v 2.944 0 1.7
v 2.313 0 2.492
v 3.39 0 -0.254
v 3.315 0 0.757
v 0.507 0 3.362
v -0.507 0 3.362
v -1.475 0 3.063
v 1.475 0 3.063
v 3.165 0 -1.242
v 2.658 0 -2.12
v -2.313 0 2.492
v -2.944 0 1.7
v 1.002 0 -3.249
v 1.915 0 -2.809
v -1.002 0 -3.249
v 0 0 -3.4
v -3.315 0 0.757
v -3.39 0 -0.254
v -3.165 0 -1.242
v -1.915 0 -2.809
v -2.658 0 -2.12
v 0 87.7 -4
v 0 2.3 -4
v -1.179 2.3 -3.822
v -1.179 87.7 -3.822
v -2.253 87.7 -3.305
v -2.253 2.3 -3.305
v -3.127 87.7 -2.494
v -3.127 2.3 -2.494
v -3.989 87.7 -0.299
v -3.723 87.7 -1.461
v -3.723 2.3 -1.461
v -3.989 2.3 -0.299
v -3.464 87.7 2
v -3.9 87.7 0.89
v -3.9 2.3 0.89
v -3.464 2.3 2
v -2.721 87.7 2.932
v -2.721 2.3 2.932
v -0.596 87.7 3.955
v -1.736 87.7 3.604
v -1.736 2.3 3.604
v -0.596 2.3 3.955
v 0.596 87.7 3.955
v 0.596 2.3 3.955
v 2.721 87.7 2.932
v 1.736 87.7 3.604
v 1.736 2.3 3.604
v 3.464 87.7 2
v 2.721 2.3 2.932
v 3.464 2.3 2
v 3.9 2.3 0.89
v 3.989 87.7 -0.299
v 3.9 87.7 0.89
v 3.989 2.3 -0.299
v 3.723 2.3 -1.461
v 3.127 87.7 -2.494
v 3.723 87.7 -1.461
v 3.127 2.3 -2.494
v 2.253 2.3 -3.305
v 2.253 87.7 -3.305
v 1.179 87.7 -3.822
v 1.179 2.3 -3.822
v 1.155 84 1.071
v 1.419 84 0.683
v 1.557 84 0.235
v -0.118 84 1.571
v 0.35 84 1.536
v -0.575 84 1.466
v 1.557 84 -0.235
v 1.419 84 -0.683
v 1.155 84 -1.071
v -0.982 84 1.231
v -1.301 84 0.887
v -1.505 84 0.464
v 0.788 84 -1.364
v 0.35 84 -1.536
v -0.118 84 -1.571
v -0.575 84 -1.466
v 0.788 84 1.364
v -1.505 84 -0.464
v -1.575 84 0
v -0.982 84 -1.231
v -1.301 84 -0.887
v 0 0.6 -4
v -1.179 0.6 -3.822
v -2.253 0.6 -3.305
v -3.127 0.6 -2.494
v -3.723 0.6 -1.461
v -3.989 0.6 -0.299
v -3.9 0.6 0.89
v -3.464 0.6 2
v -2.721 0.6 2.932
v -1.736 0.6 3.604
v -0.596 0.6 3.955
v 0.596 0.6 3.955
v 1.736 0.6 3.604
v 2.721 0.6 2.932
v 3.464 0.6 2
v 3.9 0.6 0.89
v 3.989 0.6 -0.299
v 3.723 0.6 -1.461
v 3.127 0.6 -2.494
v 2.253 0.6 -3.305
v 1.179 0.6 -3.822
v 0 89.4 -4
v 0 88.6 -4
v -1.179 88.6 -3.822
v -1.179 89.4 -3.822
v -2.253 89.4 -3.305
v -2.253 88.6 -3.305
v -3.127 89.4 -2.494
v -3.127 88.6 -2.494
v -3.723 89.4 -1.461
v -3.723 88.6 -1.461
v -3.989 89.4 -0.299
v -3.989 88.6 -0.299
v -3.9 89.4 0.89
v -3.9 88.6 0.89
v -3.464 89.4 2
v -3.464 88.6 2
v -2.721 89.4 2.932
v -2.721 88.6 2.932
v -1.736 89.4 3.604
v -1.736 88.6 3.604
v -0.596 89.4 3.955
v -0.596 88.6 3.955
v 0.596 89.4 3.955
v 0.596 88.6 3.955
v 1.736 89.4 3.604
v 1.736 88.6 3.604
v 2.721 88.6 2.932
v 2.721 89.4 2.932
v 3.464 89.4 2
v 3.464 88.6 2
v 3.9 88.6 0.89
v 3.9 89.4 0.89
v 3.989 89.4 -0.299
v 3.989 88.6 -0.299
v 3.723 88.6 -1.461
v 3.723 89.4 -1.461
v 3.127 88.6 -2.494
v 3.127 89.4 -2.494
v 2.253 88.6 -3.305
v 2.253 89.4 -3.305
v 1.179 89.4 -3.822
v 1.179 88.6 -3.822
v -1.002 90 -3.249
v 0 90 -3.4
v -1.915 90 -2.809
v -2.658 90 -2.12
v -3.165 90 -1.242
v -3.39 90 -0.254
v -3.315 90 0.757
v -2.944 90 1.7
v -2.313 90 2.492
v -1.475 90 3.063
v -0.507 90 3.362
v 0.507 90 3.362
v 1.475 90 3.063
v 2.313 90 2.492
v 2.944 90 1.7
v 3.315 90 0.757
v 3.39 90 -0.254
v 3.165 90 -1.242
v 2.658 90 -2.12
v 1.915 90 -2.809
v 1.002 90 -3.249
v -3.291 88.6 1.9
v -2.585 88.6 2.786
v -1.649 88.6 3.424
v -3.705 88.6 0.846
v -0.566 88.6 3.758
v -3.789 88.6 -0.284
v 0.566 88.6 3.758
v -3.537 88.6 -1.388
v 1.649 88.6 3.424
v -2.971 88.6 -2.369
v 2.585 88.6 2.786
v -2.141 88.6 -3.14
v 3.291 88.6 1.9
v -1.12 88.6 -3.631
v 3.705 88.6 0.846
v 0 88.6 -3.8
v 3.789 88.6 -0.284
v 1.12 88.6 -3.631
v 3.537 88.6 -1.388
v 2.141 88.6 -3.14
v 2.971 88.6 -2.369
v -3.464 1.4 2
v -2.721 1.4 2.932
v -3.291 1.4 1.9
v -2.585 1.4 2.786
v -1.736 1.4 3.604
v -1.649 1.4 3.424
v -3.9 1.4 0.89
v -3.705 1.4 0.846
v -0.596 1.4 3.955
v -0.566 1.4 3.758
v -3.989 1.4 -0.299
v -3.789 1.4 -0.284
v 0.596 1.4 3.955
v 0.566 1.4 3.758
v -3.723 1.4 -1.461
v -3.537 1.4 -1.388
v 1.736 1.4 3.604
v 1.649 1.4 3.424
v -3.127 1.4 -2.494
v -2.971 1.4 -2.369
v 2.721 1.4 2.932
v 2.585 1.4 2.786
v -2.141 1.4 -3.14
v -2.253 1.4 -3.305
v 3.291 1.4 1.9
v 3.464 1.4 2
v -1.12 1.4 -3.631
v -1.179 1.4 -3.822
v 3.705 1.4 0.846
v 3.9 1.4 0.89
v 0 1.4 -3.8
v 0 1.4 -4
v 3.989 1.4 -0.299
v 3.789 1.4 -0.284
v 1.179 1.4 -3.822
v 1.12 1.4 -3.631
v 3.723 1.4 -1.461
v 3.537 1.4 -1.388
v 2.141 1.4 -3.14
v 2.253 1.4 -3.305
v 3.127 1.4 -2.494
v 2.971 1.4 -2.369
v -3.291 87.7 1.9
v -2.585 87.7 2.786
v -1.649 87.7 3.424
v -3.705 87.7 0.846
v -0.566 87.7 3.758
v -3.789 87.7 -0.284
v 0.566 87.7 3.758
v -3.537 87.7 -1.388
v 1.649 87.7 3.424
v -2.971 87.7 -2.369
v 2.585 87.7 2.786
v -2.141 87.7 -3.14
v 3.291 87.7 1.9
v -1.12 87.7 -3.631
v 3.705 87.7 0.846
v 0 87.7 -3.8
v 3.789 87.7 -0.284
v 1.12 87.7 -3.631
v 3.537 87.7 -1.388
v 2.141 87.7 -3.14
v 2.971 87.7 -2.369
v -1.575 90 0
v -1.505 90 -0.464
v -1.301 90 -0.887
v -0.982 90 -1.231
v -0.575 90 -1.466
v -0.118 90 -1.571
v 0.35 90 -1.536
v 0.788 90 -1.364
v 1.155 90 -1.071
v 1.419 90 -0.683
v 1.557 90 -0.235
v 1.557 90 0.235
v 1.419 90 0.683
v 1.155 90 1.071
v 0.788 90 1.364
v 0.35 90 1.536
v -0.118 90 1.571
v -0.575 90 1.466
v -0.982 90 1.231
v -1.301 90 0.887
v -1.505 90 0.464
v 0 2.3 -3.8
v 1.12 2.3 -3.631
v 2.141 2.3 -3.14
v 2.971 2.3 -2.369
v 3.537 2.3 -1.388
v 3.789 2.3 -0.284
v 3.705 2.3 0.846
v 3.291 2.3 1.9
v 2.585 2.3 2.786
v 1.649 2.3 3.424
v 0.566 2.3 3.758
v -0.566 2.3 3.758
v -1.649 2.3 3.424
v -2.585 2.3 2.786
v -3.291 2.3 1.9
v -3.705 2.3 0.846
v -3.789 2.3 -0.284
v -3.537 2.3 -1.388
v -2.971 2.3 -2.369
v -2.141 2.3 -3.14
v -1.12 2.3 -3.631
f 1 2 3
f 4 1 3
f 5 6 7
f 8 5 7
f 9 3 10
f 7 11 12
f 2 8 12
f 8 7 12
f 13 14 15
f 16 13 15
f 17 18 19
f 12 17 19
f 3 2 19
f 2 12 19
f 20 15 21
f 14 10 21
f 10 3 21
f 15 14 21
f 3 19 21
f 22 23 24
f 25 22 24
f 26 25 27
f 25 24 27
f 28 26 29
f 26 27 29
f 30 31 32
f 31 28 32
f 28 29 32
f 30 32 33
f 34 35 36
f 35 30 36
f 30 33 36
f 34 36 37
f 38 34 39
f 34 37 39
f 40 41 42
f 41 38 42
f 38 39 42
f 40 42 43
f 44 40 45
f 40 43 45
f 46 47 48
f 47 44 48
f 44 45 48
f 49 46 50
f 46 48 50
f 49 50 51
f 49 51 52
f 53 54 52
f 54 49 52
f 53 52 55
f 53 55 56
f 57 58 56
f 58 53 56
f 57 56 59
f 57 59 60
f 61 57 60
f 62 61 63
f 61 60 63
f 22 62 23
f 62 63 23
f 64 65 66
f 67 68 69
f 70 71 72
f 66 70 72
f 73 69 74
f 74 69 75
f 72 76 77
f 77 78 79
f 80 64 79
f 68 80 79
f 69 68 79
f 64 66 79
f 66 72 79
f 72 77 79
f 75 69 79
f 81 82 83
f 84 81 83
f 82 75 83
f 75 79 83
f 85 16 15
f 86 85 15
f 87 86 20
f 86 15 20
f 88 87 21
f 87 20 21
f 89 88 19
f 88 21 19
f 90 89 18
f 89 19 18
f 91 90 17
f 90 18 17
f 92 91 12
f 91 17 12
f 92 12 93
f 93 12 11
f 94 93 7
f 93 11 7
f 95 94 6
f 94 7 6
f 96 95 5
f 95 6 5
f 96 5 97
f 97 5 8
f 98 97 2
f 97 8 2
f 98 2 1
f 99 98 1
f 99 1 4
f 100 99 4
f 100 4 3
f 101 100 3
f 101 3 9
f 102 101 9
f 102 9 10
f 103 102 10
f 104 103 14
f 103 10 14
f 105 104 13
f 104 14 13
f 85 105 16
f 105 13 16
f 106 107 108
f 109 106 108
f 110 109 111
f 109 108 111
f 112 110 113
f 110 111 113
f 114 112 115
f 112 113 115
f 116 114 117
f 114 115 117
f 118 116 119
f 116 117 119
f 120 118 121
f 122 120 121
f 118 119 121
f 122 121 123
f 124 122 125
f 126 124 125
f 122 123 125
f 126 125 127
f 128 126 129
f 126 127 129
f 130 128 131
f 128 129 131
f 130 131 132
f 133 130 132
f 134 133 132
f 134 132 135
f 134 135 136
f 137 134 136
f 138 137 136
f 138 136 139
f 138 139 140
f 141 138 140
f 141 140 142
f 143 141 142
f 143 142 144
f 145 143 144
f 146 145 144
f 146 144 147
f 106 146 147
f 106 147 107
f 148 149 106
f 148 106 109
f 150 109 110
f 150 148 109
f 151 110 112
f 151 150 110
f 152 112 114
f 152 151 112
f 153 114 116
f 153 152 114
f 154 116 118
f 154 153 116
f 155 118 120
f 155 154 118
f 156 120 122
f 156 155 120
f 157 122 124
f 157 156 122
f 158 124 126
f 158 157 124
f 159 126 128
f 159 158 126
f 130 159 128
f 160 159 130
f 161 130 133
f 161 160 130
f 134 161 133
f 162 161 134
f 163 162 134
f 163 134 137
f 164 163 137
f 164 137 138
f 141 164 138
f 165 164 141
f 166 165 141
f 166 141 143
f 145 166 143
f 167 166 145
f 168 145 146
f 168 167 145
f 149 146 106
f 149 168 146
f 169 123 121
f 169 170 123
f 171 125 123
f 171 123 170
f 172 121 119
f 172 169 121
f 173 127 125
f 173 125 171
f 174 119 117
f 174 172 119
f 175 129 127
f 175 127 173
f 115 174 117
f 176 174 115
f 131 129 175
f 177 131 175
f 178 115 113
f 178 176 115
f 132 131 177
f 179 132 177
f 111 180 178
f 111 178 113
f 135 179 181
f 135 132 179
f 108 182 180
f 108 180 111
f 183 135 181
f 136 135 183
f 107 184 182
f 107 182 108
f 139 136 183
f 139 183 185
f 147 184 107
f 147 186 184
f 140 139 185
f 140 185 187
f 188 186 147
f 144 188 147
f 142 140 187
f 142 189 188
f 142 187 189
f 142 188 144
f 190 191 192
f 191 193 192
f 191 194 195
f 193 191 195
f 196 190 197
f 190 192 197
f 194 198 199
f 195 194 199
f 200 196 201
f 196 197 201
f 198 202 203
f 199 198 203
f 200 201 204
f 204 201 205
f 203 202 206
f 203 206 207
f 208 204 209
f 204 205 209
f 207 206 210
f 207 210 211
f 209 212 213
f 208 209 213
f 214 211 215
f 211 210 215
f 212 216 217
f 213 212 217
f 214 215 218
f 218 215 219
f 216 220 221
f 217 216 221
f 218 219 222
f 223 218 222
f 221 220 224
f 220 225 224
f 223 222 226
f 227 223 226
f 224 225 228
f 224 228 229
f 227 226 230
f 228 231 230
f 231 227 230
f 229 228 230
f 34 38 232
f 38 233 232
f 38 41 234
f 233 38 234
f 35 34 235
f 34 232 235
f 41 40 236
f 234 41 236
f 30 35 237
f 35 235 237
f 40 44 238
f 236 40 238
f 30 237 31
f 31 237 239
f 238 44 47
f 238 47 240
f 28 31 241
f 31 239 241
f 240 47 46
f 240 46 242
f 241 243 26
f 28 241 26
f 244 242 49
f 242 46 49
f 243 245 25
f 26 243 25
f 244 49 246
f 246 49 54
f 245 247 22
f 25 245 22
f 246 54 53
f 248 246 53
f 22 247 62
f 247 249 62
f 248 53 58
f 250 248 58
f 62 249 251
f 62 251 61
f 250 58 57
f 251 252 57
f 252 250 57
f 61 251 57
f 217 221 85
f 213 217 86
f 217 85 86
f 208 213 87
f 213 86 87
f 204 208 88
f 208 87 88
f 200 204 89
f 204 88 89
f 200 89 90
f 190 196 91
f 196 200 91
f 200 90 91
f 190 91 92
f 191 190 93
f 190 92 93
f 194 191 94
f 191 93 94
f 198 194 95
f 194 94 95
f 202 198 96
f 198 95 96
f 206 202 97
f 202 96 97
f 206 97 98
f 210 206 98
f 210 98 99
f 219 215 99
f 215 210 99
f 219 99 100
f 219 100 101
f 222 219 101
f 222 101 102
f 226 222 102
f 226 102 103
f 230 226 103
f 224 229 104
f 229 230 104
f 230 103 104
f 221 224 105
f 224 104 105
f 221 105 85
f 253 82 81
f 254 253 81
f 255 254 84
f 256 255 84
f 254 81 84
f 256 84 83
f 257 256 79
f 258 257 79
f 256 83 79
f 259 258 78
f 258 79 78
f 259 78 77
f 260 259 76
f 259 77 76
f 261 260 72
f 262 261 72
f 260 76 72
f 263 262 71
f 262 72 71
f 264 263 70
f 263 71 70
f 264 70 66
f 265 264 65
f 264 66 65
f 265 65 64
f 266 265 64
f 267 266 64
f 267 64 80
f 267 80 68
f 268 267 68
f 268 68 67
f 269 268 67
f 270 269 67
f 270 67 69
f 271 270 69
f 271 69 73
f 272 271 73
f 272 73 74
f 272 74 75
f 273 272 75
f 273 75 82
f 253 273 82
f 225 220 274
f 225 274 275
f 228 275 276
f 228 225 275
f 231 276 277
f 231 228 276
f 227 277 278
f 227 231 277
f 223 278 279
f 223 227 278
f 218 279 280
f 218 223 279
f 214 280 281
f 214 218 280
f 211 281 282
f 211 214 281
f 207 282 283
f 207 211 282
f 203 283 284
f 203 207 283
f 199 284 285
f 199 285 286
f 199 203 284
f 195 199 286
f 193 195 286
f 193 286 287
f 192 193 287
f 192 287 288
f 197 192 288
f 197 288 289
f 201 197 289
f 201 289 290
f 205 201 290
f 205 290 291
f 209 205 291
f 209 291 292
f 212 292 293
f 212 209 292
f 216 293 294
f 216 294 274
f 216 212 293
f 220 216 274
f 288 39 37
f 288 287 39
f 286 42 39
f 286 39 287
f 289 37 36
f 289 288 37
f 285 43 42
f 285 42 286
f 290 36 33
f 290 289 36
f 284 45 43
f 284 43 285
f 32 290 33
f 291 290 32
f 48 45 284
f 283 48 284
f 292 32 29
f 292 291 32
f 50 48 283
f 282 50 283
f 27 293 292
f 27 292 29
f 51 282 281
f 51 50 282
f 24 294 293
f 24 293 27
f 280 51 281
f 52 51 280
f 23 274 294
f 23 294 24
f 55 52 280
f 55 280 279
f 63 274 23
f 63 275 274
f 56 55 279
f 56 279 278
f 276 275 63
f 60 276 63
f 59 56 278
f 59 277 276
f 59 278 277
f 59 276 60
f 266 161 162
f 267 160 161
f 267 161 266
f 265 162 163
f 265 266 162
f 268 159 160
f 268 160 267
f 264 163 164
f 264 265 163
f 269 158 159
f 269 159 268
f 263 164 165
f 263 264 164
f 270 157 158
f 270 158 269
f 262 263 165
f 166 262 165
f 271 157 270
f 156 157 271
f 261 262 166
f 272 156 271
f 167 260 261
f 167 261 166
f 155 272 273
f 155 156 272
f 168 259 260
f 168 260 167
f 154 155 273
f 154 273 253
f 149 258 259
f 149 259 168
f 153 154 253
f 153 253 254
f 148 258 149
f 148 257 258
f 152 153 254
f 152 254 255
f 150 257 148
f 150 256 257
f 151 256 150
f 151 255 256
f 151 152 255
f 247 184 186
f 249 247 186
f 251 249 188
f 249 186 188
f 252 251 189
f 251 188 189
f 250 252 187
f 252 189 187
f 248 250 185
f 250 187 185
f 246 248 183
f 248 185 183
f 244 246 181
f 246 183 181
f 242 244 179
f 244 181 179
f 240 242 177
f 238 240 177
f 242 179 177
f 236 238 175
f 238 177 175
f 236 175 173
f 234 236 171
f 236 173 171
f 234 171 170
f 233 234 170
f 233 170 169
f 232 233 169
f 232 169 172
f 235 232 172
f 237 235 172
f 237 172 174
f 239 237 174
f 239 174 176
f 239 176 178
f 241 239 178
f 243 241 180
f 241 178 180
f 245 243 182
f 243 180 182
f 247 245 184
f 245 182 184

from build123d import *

# Parameters (mm, degrees)
SKETCH1_R                        = 4
BOSS_EXTRUDE1_DEPTH              = 90
CHAMFER1_SIZE                    = 0.6
CUT_EXTRUDE1_START               = -1.4
SKETCH2_R                        = 4
SKETCH2_R_2                      = 3.8
CUT_EXTRUDE1_DEPTH               = 0.9
TAP_DRILL_FOR_M3_HELICOIL1_D     = 3.15
TAP_DRILL_FOR_M3_HELICOIL1_DEPTH = 6


with BuildPart() as part:
    # Sketch1 → Boss-Extrude1 (new body)
    with BuildSketch(Plane(origin=(0, 0, 0), x_dir=(1, 0, 0), z_dir=(0, 1, 0))):
        with Locations(Location((0, 0, 0), (0, 0, 90))):
            Circle(SKETCH1_R)
    extrude(amount=BOSS_EXTRUDE1_DEPTH)

    # Chamfer1
    chamfer1_edges = [part.edges().sort_by_distance(p)[0] for p in [
        (0, 0, 4),
        (0, 90, 4),
    ]]
    chamfer(chamfer1_edges, length=CHAMFER1_SIZE)

    # Sketch2 → Cut-Extrude1 (cut)
    with BuildSketch(Plane.XZ.offset(CUT_EXTRUDE1_START)):
        with Locations(Location((0, 0, 0), (0, 0, 270))):
            Circle(SKETCH2_R)
        with Locations(Location((0, 0, 0), (0, 0, 270))):
            Circle(SKETCH2_R_2, mode=Mode.SUBTRACT)
    cut_extrude1 = extrude(amount=-CUT_EXTRUDE1_DEPTH, mode=Mode.SUBTRACT)

    # Tap Drill for M3 Helicoil1
    with Locations(Plane(origin=(0, 90, 0), x_dir=(1, 0, 0), z_dir=(0, 1, 0))):
        with Locations((0, 0)):
            Hole(TAP_DRILL_FOR_M3_HELICOIL1_D / 2, depth=TAP_DRILL_FOR_M3_HELICOIL1_DEPTH)

    # Mirror1: Cut-Extrude1 across plane
    add(cut_extrude1.mirror(Plane(origin=(0, 45, 0), x_dir=(0, 0, 1), z_dir=(0, -1, 0))), mode=Mode.SUBTRACT)


solid = part.part
